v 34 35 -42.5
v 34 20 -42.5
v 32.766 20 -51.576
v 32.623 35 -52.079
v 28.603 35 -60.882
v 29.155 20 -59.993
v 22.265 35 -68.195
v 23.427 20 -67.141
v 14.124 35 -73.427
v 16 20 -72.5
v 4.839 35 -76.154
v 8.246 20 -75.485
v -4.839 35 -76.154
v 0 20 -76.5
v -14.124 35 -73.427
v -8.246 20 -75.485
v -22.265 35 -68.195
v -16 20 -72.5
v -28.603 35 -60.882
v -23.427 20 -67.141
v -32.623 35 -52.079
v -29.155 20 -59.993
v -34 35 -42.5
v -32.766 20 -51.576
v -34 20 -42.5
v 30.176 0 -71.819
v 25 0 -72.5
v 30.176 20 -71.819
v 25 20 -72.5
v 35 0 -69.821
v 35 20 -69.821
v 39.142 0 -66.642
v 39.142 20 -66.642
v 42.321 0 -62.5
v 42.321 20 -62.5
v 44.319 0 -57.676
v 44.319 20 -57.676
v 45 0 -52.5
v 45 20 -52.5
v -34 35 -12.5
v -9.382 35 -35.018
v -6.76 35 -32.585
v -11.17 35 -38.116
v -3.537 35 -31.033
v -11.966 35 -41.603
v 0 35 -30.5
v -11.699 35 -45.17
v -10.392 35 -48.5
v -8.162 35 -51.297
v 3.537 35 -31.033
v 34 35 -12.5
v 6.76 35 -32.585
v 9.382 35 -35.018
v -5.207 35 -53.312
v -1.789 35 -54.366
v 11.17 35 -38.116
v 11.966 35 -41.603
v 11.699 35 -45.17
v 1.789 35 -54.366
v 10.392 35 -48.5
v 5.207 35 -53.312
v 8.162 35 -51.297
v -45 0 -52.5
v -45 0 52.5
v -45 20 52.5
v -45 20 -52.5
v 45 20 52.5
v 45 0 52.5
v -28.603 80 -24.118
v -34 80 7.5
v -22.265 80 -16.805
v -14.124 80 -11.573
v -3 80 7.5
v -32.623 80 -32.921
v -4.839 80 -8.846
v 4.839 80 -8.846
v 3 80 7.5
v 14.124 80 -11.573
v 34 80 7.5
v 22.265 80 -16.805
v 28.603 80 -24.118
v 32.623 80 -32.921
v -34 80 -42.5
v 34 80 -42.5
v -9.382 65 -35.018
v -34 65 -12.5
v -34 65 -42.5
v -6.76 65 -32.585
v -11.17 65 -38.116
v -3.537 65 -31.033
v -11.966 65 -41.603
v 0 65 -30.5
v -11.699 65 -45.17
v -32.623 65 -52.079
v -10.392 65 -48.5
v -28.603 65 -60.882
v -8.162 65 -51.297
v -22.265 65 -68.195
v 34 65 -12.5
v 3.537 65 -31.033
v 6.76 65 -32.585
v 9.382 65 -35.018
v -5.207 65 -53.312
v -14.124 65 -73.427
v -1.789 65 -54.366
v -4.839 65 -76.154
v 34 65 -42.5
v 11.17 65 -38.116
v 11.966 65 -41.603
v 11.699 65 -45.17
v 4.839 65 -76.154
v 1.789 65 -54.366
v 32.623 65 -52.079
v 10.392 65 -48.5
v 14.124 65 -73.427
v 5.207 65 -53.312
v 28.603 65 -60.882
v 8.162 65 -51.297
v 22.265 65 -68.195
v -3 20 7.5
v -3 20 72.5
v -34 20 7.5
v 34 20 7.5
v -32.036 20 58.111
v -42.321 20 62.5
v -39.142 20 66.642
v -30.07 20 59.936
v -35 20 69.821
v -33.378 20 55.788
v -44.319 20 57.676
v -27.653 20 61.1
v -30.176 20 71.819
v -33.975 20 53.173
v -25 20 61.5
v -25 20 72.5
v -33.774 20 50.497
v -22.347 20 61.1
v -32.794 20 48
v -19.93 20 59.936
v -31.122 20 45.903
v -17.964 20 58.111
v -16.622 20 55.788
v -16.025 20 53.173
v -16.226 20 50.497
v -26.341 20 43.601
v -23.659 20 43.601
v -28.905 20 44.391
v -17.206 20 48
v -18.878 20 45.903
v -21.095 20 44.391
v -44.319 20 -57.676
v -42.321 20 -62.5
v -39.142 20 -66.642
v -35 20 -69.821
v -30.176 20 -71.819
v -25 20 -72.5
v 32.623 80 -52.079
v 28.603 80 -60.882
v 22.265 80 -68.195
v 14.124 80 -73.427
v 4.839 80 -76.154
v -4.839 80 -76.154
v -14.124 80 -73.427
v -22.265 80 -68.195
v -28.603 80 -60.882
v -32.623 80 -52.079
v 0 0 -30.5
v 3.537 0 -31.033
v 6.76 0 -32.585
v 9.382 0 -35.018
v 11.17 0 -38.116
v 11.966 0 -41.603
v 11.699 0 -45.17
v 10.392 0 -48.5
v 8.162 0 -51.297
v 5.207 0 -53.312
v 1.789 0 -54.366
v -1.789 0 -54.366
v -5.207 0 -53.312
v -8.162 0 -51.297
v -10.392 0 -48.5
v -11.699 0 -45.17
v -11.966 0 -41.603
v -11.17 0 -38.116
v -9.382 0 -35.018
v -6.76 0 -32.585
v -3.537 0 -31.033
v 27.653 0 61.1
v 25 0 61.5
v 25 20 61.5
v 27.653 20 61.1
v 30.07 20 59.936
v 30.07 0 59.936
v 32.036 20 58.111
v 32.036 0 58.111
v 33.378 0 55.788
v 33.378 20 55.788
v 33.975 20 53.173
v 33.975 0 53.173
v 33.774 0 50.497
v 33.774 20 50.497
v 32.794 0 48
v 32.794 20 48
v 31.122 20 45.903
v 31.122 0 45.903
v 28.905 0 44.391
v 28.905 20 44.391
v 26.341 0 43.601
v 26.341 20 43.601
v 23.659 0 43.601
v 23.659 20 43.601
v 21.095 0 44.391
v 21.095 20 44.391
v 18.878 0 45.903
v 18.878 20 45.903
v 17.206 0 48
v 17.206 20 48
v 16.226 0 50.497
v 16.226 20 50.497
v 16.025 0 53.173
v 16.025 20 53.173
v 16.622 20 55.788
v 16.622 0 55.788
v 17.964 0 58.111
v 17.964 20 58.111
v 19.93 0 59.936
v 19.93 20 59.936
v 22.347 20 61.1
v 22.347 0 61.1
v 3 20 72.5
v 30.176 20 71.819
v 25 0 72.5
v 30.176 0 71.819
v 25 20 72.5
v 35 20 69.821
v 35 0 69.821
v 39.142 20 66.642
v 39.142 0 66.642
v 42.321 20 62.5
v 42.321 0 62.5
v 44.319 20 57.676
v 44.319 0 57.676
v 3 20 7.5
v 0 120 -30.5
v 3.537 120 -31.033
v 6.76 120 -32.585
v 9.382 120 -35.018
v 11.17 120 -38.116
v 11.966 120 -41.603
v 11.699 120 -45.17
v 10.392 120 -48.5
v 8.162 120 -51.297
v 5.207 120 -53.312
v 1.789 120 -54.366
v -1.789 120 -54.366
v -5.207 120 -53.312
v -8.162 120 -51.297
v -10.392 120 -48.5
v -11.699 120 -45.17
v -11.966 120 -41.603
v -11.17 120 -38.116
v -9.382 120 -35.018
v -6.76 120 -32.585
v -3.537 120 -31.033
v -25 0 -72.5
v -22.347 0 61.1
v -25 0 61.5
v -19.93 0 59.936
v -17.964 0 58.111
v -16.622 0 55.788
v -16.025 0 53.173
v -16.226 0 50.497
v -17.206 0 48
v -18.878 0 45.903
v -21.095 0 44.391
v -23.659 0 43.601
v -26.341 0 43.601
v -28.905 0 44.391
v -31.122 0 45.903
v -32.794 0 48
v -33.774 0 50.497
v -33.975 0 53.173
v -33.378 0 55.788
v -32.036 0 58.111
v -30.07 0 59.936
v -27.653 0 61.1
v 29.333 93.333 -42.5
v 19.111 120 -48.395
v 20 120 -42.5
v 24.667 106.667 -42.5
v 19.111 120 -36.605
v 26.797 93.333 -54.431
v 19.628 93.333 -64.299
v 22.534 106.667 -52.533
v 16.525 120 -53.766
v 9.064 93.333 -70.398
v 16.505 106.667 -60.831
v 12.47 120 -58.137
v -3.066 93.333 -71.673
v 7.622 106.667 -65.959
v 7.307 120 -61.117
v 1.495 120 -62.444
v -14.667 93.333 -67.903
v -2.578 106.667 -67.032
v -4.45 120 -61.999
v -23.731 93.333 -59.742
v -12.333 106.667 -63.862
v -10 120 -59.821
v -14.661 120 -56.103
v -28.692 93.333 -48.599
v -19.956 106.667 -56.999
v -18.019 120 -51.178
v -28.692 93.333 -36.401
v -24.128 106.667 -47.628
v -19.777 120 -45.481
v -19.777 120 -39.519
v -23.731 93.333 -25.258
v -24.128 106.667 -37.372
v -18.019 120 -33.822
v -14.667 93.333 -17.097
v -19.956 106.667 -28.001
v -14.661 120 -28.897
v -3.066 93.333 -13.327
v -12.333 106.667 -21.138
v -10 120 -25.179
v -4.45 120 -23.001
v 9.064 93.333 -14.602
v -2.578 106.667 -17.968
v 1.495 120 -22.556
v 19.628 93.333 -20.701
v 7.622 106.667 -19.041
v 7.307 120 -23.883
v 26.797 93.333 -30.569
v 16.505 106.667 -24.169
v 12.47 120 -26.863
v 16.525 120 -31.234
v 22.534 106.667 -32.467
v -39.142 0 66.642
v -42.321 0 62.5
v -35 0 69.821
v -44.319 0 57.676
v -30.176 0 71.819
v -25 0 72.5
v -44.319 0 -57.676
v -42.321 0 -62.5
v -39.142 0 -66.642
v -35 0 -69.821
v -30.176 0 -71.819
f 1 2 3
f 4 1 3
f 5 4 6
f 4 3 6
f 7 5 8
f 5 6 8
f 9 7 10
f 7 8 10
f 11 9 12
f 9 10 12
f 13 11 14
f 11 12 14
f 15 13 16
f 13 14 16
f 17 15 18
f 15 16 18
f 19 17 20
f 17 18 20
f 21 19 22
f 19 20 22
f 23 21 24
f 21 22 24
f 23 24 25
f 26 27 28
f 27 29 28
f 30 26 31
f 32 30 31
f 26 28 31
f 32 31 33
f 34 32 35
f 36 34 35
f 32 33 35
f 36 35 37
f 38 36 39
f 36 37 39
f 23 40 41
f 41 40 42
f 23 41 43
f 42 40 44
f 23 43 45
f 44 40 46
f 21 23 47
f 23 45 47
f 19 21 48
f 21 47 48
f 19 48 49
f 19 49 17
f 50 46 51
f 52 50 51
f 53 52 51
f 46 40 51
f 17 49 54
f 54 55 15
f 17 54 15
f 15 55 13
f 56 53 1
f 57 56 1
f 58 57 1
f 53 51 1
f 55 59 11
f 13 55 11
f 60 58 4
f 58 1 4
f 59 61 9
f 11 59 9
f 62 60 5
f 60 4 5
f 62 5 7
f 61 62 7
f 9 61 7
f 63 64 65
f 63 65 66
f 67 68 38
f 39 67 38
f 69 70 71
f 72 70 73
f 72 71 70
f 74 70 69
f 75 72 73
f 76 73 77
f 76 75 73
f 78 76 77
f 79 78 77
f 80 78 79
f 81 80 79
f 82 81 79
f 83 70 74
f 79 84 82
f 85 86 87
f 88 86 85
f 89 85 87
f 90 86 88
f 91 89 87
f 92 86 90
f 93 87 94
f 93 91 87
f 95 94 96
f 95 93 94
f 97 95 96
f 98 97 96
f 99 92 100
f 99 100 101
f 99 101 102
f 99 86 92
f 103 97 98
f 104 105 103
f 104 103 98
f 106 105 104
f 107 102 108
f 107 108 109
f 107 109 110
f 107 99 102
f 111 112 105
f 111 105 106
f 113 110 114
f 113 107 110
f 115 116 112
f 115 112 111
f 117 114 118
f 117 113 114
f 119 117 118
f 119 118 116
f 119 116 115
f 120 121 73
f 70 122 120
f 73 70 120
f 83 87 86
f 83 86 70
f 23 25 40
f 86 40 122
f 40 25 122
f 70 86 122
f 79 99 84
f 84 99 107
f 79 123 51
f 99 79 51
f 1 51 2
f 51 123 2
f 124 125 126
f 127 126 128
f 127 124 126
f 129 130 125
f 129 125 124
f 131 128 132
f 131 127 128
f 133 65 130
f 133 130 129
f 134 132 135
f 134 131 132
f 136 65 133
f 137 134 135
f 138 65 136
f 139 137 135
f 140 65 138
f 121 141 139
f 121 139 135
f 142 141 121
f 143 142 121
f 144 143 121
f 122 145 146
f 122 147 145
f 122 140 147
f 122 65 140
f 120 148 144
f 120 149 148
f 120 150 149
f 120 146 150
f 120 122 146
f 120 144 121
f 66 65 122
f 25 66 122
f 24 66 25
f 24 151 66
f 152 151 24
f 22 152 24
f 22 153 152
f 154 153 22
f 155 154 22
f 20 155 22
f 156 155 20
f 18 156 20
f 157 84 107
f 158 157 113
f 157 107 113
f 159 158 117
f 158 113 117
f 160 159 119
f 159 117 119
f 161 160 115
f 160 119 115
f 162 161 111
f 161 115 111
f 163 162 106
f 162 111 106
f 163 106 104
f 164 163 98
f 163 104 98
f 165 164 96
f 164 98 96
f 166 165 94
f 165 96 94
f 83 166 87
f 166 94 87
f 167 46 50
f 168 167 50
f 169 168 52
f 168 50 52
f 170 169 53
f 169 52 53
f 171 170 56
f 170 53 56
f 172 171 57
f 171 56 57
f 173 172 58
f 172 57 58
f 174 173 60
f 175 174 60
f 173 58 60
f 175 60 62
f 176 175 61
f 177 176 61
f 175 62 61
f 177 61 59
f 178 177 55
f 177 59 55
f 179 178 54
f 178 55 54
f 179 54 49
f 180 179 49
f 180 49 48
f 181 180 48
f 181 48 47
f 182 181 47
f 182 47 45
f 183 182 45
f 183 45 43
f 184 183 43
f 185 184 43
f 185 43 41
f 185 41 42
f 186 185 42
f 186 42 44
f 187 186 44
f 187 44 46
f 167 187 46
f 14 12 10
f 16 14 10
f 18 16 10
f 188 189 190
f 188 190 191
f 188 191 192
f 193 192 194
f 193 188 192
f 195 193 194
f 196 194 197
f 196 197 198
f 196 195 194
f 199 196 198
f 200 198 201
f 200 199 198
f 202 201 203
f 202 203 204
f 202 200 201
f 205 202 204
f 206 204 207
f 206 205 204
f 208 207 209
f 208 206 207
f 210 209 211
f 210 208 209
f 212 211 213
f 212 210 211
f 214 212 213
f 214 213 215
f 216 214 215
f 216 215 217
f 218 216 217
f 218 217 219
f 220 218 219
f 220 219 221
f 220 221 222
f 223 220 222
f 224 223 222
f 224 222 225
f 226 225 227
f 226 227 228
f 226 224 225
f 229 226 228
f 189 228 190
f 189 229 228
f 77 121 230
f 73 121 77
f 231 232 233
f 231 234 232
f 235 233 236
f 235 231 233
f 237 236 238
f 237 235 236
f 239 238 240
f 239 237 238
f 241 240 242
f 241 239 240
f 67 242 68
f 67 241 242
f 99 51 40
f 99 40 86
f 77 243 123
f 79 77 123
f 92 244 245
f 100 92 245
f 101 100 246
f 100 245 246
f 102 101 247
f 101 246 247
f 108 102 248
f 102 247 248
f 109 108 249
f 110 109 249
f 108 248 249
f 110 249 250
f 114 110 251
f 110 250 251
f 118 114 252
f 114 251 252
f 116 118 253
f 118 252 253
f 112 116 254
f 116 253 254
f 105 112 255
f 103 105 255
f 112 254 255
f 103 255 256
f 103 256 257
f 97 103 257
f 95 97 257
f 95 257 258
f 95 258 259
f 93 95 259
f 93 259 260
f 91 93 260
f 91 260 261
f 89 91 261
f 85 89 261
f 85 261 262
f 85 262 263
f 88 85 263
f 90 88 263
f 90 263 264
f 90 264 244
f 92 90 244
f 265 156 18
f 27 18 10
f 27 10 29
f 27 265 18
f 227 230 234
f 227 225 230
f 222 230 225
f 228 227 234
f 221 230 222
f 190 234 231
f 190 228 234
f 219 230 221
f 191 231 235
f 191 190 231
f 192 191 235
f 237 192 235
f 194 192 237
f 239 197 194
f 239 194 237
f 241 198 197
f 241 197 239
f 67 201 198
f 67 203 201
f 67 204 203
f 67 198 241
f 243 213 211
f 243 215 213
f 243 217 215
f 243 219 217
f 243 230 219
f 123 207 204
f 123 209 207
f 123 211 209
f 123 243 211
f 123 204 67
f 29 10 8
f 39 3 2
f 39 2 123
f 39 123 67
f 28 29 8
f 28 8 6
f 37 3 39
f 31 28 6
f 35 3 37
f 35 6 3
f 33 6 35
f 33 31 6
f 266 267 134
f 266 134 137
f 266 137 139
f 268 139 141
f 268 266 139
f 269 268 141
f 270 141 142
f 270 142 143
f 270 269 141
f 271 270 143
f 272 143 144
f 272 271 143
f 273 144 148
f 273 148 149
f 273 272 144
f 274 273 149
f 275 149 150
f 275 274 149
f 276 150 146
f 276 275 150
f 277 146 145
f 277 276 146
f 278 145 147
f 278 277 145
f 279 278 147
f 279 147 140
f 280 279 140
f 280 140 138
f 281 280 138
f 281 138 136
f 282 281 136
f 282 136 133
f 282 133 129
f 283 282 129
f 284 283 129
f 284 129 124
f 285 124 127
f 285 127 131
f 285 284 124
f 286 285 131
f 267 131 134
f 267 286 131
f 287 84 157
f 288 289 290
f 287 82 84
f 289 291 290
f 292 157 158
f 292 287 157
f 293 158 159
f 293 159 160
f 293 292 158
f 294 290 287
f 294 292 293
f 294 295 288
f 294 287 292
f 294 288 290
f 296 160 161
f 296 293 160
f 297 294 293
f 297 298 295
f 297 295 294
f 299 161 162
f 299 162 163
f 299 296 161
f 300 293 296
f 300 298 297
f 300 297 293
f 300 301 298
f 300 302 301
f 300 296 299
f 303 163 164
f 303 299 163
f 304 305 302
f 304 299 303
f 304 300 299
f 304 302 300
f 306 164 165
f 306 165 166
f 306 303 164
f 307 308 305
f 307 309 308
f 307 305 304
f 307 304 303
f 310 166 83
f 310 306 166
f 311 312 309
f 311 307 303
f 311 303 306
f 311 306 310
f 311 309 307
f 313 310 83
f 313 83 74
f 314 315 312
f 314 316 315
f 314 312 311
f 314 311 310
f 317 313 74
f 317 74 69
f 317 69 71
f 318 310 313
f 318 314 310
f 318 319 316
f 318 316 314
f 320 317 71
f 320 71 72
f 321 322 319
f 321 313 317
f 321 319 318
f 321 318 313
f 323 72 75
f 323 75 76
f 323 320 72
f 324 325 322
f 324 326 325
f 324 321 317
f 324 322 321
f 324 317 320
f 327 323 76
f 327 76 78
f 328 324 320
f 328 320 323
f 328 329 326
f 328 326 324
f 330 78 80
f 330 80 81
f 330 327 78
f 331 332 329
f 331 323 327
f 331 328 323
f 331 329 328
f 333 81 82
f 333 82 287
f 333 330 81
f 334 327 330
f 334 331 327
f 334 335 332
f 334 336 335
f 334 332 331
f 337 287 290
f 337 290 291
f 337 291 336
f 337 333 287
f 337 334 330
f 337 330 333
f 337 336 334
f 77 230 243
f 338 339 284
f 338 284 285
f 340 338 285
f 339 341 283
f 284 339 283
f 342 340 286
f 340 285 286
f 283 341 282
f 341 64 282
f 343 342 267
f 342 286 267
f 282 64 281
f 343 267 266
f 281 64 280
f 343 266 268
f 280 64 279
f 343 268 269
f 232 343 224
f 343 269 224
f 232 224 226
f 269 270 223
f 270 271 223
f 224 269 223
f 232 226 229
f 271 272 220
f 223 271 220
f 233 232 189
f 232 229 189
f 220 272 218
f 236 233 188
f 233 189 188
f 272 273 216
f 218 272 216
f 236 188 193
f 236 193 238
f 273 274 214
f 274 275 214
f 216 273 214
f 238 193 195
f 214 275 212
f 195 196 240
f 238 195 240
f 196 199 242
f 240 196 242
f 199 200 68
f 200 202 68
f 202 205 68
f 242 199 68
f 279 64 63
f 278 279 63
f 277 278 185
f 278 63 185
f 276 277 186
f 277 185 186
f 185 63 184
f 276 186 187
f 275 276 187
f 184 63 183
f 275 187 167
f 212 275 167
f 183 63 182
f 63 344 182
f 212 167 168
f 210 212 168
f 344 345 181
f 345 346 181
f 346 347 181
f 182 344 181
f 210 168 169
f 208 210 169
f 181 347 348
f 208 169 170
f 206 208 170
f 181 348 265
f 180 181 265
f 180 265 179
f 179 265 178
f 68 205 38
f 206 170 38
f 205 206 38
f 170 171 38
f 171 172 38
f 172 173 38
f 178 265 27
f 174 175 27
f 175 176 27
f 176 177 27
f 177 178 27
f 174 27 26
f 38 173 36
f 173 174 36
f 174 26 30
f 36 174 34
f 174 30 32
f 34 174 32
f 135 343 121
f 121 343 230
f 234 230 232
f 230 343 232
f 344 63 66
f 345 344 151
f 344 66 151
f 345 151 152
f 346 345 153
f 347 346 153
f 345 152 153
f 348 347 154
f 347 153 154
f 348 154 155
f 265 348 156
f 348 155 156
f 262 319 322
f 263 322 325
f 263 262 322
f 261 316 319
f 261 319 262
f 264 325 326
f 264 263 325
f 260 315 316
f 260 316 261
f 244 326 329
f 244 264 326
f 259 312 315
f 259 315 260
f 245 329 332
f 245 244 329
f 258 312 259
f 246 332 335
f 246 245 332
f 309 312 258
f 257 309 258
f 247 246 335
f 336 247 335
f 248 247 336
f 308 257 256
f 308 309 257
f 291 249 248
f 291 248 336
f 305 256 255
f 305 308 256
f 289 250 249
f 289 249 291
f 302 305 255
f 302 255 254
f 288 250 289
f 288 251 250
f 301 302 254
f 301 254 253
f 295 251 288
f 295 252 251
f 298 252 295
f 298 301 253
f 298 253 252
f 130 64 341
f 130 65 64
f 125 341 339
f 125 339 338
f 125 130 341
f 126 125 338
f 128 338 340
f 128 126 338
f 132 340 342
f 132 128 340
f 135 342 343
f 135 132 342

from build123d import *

# Parameters (mm, degrees)
SKETCH2_W           = 90
SKETCH2_H           = 145
SKETCH2_R           = 9
BOSS_EXTRUDE2_DEPTH = 20
FILLET1_R           = 20
FILLET2_R           = 20
BOSS_EXTRUDE3_DEPTH = 60
SKETCH4_W           = 83.251362913
SKETCH4_H           = 30
CUT_EXTRUDE1_DEPTH  = 136.98988933
SKETCH5_R           = 34
SKETCH6_R           = 20
SKETCH6_3_R         = 12
CUT_EXTRUDE2_DEPTH  = 150.255653211
RIB2_REACH          = 151.256
SKETCH9_WALL_W      = 388.970336646
SKETCH9_WALL_H      = 6


with BuildPart() as part:
    # Sketch2 → Boss-Extrude2 (new body)
    with BuildSketch(Plane(origin=(0, 0, 0), x_dir=(1, 0, 0), z_dir=(0, 1, 0))):
        Rectangle(SKETCH2_W, SKETCH2_H)
        with Locations(Location((-25, -52.5, 0), (0, 0, 270))):
            Circle(SKETCH2_R, mode=Mode.SUBTRACT)
        with Locations(Location((25, -52.5, 0), (0, 0, 270))):
            Circle(SKETCH2_R, mode=Mode.SUBTRACT)
    extrude(amount=BOSS_EXTRUDE2_DEPTH)

    # Fillet1
    fillet1_edges = [part.edges().sort_by_distance(p)[0] for p in [
        (45, 10, 72.5),
        (-45, 10, 72.5),
    ]]
    fillet(fillet1_edges, radius=FILLET1_R)

    # Fillet2
    fillet2_edges = [part.edges().sort_by_distance(p)[0] for p in [
        (-45, 10, -72.5),
        (45, 10, -72.5),
    ]]
    fillet(fillet2_edges, radius=FILLET2_R)

    # Sketch3 → Boss-Extrude3 (add)
    with BuildSketch(Plane(origin=(0, 20, 0), x_dir=(1, 0, 0), z_dir=(0, 1, 0))):
        with BuildLine():
            Line((-34, -7.5), (34, -7.5))
            Line((34, -7.5), (34, 42.5))
            ThreePointArc((34, 42.5), (0, 76.5), (-34, 42.5))
            Line((-34, 42.5), (-34, -7.5))
        make_face()
    extrude(amount=BOSS_EXTRUDE3_DEPTH)

    # Sketch4 → Cut-Extrude1 (cut, through all)
    with BuildSketch(Plane(origin=(34, 0, 0), x_dir=(0, 0, -1), z_dir=(1, 0, 0))):
        with Locations((54.125681457, 50)):
            Rectangle(SKETCH4_W, SKETCH4_H)
    extrude(amount=-CUT_EXTRUDE1_DEPTH, mode=Mode.SUBTRACT)

    # Sketch5 → Loft1 section 0
    with BuildSketch(Plane(origin=(0, 80, 0), x_dir=(1, 0, 0), z_dir=(0, 1, 0))):
        with Locations((0, 42.5)):
            Circle(SKETCH5_R)
    # Sketch6 → Loft1 section 1
    with BuildSketch(Plane(origin=(0, 120, 0), x_dir=(1, 0, 0), z_dir=(0, 1, 0))):
        with Locations((0, 42.5)):
            Circle(SKETCH6_R)
    loft()

    # Sketch6<3> → Cut-Extrude2 (cut, through all)
    with BuildSketch(Plane(origin=(0, 120, 0), x_dir=(1, 0, 0), z_dir=(0, 1, 0))):
        with Locations(Location((0, 42.5, 0), (0, 0, 270))):
            Circle(SKETCH6_3_R)
    extrude(amount=-CUT_EXTRUDE2_DEPTH, mode=Mode.SUBTRACT)

    # Sketch9 wall → Rib2 (add, up to next)
    with BuildSketch(Plane(origin=(0, 50, 40), x_dir=(0, 0.678280102733, -0.734803444627), z_dir=(0, 0.734803444627, 0.678280102733)), mode=Mode.PRIVATE) as rib2_sk1:
        Rectangle(SKETCH9_WALL_W, SKETCH9_WALL_H)
    rib2_tool1 = extrude(rib2_sk1.sketch, amount=-RIB2_REACH, mode=Mode.PRIVATE) - part.part
    add(rib2_tool1.solids().sort_by_distance((0, 50, 40))[0])


solid = part.part
